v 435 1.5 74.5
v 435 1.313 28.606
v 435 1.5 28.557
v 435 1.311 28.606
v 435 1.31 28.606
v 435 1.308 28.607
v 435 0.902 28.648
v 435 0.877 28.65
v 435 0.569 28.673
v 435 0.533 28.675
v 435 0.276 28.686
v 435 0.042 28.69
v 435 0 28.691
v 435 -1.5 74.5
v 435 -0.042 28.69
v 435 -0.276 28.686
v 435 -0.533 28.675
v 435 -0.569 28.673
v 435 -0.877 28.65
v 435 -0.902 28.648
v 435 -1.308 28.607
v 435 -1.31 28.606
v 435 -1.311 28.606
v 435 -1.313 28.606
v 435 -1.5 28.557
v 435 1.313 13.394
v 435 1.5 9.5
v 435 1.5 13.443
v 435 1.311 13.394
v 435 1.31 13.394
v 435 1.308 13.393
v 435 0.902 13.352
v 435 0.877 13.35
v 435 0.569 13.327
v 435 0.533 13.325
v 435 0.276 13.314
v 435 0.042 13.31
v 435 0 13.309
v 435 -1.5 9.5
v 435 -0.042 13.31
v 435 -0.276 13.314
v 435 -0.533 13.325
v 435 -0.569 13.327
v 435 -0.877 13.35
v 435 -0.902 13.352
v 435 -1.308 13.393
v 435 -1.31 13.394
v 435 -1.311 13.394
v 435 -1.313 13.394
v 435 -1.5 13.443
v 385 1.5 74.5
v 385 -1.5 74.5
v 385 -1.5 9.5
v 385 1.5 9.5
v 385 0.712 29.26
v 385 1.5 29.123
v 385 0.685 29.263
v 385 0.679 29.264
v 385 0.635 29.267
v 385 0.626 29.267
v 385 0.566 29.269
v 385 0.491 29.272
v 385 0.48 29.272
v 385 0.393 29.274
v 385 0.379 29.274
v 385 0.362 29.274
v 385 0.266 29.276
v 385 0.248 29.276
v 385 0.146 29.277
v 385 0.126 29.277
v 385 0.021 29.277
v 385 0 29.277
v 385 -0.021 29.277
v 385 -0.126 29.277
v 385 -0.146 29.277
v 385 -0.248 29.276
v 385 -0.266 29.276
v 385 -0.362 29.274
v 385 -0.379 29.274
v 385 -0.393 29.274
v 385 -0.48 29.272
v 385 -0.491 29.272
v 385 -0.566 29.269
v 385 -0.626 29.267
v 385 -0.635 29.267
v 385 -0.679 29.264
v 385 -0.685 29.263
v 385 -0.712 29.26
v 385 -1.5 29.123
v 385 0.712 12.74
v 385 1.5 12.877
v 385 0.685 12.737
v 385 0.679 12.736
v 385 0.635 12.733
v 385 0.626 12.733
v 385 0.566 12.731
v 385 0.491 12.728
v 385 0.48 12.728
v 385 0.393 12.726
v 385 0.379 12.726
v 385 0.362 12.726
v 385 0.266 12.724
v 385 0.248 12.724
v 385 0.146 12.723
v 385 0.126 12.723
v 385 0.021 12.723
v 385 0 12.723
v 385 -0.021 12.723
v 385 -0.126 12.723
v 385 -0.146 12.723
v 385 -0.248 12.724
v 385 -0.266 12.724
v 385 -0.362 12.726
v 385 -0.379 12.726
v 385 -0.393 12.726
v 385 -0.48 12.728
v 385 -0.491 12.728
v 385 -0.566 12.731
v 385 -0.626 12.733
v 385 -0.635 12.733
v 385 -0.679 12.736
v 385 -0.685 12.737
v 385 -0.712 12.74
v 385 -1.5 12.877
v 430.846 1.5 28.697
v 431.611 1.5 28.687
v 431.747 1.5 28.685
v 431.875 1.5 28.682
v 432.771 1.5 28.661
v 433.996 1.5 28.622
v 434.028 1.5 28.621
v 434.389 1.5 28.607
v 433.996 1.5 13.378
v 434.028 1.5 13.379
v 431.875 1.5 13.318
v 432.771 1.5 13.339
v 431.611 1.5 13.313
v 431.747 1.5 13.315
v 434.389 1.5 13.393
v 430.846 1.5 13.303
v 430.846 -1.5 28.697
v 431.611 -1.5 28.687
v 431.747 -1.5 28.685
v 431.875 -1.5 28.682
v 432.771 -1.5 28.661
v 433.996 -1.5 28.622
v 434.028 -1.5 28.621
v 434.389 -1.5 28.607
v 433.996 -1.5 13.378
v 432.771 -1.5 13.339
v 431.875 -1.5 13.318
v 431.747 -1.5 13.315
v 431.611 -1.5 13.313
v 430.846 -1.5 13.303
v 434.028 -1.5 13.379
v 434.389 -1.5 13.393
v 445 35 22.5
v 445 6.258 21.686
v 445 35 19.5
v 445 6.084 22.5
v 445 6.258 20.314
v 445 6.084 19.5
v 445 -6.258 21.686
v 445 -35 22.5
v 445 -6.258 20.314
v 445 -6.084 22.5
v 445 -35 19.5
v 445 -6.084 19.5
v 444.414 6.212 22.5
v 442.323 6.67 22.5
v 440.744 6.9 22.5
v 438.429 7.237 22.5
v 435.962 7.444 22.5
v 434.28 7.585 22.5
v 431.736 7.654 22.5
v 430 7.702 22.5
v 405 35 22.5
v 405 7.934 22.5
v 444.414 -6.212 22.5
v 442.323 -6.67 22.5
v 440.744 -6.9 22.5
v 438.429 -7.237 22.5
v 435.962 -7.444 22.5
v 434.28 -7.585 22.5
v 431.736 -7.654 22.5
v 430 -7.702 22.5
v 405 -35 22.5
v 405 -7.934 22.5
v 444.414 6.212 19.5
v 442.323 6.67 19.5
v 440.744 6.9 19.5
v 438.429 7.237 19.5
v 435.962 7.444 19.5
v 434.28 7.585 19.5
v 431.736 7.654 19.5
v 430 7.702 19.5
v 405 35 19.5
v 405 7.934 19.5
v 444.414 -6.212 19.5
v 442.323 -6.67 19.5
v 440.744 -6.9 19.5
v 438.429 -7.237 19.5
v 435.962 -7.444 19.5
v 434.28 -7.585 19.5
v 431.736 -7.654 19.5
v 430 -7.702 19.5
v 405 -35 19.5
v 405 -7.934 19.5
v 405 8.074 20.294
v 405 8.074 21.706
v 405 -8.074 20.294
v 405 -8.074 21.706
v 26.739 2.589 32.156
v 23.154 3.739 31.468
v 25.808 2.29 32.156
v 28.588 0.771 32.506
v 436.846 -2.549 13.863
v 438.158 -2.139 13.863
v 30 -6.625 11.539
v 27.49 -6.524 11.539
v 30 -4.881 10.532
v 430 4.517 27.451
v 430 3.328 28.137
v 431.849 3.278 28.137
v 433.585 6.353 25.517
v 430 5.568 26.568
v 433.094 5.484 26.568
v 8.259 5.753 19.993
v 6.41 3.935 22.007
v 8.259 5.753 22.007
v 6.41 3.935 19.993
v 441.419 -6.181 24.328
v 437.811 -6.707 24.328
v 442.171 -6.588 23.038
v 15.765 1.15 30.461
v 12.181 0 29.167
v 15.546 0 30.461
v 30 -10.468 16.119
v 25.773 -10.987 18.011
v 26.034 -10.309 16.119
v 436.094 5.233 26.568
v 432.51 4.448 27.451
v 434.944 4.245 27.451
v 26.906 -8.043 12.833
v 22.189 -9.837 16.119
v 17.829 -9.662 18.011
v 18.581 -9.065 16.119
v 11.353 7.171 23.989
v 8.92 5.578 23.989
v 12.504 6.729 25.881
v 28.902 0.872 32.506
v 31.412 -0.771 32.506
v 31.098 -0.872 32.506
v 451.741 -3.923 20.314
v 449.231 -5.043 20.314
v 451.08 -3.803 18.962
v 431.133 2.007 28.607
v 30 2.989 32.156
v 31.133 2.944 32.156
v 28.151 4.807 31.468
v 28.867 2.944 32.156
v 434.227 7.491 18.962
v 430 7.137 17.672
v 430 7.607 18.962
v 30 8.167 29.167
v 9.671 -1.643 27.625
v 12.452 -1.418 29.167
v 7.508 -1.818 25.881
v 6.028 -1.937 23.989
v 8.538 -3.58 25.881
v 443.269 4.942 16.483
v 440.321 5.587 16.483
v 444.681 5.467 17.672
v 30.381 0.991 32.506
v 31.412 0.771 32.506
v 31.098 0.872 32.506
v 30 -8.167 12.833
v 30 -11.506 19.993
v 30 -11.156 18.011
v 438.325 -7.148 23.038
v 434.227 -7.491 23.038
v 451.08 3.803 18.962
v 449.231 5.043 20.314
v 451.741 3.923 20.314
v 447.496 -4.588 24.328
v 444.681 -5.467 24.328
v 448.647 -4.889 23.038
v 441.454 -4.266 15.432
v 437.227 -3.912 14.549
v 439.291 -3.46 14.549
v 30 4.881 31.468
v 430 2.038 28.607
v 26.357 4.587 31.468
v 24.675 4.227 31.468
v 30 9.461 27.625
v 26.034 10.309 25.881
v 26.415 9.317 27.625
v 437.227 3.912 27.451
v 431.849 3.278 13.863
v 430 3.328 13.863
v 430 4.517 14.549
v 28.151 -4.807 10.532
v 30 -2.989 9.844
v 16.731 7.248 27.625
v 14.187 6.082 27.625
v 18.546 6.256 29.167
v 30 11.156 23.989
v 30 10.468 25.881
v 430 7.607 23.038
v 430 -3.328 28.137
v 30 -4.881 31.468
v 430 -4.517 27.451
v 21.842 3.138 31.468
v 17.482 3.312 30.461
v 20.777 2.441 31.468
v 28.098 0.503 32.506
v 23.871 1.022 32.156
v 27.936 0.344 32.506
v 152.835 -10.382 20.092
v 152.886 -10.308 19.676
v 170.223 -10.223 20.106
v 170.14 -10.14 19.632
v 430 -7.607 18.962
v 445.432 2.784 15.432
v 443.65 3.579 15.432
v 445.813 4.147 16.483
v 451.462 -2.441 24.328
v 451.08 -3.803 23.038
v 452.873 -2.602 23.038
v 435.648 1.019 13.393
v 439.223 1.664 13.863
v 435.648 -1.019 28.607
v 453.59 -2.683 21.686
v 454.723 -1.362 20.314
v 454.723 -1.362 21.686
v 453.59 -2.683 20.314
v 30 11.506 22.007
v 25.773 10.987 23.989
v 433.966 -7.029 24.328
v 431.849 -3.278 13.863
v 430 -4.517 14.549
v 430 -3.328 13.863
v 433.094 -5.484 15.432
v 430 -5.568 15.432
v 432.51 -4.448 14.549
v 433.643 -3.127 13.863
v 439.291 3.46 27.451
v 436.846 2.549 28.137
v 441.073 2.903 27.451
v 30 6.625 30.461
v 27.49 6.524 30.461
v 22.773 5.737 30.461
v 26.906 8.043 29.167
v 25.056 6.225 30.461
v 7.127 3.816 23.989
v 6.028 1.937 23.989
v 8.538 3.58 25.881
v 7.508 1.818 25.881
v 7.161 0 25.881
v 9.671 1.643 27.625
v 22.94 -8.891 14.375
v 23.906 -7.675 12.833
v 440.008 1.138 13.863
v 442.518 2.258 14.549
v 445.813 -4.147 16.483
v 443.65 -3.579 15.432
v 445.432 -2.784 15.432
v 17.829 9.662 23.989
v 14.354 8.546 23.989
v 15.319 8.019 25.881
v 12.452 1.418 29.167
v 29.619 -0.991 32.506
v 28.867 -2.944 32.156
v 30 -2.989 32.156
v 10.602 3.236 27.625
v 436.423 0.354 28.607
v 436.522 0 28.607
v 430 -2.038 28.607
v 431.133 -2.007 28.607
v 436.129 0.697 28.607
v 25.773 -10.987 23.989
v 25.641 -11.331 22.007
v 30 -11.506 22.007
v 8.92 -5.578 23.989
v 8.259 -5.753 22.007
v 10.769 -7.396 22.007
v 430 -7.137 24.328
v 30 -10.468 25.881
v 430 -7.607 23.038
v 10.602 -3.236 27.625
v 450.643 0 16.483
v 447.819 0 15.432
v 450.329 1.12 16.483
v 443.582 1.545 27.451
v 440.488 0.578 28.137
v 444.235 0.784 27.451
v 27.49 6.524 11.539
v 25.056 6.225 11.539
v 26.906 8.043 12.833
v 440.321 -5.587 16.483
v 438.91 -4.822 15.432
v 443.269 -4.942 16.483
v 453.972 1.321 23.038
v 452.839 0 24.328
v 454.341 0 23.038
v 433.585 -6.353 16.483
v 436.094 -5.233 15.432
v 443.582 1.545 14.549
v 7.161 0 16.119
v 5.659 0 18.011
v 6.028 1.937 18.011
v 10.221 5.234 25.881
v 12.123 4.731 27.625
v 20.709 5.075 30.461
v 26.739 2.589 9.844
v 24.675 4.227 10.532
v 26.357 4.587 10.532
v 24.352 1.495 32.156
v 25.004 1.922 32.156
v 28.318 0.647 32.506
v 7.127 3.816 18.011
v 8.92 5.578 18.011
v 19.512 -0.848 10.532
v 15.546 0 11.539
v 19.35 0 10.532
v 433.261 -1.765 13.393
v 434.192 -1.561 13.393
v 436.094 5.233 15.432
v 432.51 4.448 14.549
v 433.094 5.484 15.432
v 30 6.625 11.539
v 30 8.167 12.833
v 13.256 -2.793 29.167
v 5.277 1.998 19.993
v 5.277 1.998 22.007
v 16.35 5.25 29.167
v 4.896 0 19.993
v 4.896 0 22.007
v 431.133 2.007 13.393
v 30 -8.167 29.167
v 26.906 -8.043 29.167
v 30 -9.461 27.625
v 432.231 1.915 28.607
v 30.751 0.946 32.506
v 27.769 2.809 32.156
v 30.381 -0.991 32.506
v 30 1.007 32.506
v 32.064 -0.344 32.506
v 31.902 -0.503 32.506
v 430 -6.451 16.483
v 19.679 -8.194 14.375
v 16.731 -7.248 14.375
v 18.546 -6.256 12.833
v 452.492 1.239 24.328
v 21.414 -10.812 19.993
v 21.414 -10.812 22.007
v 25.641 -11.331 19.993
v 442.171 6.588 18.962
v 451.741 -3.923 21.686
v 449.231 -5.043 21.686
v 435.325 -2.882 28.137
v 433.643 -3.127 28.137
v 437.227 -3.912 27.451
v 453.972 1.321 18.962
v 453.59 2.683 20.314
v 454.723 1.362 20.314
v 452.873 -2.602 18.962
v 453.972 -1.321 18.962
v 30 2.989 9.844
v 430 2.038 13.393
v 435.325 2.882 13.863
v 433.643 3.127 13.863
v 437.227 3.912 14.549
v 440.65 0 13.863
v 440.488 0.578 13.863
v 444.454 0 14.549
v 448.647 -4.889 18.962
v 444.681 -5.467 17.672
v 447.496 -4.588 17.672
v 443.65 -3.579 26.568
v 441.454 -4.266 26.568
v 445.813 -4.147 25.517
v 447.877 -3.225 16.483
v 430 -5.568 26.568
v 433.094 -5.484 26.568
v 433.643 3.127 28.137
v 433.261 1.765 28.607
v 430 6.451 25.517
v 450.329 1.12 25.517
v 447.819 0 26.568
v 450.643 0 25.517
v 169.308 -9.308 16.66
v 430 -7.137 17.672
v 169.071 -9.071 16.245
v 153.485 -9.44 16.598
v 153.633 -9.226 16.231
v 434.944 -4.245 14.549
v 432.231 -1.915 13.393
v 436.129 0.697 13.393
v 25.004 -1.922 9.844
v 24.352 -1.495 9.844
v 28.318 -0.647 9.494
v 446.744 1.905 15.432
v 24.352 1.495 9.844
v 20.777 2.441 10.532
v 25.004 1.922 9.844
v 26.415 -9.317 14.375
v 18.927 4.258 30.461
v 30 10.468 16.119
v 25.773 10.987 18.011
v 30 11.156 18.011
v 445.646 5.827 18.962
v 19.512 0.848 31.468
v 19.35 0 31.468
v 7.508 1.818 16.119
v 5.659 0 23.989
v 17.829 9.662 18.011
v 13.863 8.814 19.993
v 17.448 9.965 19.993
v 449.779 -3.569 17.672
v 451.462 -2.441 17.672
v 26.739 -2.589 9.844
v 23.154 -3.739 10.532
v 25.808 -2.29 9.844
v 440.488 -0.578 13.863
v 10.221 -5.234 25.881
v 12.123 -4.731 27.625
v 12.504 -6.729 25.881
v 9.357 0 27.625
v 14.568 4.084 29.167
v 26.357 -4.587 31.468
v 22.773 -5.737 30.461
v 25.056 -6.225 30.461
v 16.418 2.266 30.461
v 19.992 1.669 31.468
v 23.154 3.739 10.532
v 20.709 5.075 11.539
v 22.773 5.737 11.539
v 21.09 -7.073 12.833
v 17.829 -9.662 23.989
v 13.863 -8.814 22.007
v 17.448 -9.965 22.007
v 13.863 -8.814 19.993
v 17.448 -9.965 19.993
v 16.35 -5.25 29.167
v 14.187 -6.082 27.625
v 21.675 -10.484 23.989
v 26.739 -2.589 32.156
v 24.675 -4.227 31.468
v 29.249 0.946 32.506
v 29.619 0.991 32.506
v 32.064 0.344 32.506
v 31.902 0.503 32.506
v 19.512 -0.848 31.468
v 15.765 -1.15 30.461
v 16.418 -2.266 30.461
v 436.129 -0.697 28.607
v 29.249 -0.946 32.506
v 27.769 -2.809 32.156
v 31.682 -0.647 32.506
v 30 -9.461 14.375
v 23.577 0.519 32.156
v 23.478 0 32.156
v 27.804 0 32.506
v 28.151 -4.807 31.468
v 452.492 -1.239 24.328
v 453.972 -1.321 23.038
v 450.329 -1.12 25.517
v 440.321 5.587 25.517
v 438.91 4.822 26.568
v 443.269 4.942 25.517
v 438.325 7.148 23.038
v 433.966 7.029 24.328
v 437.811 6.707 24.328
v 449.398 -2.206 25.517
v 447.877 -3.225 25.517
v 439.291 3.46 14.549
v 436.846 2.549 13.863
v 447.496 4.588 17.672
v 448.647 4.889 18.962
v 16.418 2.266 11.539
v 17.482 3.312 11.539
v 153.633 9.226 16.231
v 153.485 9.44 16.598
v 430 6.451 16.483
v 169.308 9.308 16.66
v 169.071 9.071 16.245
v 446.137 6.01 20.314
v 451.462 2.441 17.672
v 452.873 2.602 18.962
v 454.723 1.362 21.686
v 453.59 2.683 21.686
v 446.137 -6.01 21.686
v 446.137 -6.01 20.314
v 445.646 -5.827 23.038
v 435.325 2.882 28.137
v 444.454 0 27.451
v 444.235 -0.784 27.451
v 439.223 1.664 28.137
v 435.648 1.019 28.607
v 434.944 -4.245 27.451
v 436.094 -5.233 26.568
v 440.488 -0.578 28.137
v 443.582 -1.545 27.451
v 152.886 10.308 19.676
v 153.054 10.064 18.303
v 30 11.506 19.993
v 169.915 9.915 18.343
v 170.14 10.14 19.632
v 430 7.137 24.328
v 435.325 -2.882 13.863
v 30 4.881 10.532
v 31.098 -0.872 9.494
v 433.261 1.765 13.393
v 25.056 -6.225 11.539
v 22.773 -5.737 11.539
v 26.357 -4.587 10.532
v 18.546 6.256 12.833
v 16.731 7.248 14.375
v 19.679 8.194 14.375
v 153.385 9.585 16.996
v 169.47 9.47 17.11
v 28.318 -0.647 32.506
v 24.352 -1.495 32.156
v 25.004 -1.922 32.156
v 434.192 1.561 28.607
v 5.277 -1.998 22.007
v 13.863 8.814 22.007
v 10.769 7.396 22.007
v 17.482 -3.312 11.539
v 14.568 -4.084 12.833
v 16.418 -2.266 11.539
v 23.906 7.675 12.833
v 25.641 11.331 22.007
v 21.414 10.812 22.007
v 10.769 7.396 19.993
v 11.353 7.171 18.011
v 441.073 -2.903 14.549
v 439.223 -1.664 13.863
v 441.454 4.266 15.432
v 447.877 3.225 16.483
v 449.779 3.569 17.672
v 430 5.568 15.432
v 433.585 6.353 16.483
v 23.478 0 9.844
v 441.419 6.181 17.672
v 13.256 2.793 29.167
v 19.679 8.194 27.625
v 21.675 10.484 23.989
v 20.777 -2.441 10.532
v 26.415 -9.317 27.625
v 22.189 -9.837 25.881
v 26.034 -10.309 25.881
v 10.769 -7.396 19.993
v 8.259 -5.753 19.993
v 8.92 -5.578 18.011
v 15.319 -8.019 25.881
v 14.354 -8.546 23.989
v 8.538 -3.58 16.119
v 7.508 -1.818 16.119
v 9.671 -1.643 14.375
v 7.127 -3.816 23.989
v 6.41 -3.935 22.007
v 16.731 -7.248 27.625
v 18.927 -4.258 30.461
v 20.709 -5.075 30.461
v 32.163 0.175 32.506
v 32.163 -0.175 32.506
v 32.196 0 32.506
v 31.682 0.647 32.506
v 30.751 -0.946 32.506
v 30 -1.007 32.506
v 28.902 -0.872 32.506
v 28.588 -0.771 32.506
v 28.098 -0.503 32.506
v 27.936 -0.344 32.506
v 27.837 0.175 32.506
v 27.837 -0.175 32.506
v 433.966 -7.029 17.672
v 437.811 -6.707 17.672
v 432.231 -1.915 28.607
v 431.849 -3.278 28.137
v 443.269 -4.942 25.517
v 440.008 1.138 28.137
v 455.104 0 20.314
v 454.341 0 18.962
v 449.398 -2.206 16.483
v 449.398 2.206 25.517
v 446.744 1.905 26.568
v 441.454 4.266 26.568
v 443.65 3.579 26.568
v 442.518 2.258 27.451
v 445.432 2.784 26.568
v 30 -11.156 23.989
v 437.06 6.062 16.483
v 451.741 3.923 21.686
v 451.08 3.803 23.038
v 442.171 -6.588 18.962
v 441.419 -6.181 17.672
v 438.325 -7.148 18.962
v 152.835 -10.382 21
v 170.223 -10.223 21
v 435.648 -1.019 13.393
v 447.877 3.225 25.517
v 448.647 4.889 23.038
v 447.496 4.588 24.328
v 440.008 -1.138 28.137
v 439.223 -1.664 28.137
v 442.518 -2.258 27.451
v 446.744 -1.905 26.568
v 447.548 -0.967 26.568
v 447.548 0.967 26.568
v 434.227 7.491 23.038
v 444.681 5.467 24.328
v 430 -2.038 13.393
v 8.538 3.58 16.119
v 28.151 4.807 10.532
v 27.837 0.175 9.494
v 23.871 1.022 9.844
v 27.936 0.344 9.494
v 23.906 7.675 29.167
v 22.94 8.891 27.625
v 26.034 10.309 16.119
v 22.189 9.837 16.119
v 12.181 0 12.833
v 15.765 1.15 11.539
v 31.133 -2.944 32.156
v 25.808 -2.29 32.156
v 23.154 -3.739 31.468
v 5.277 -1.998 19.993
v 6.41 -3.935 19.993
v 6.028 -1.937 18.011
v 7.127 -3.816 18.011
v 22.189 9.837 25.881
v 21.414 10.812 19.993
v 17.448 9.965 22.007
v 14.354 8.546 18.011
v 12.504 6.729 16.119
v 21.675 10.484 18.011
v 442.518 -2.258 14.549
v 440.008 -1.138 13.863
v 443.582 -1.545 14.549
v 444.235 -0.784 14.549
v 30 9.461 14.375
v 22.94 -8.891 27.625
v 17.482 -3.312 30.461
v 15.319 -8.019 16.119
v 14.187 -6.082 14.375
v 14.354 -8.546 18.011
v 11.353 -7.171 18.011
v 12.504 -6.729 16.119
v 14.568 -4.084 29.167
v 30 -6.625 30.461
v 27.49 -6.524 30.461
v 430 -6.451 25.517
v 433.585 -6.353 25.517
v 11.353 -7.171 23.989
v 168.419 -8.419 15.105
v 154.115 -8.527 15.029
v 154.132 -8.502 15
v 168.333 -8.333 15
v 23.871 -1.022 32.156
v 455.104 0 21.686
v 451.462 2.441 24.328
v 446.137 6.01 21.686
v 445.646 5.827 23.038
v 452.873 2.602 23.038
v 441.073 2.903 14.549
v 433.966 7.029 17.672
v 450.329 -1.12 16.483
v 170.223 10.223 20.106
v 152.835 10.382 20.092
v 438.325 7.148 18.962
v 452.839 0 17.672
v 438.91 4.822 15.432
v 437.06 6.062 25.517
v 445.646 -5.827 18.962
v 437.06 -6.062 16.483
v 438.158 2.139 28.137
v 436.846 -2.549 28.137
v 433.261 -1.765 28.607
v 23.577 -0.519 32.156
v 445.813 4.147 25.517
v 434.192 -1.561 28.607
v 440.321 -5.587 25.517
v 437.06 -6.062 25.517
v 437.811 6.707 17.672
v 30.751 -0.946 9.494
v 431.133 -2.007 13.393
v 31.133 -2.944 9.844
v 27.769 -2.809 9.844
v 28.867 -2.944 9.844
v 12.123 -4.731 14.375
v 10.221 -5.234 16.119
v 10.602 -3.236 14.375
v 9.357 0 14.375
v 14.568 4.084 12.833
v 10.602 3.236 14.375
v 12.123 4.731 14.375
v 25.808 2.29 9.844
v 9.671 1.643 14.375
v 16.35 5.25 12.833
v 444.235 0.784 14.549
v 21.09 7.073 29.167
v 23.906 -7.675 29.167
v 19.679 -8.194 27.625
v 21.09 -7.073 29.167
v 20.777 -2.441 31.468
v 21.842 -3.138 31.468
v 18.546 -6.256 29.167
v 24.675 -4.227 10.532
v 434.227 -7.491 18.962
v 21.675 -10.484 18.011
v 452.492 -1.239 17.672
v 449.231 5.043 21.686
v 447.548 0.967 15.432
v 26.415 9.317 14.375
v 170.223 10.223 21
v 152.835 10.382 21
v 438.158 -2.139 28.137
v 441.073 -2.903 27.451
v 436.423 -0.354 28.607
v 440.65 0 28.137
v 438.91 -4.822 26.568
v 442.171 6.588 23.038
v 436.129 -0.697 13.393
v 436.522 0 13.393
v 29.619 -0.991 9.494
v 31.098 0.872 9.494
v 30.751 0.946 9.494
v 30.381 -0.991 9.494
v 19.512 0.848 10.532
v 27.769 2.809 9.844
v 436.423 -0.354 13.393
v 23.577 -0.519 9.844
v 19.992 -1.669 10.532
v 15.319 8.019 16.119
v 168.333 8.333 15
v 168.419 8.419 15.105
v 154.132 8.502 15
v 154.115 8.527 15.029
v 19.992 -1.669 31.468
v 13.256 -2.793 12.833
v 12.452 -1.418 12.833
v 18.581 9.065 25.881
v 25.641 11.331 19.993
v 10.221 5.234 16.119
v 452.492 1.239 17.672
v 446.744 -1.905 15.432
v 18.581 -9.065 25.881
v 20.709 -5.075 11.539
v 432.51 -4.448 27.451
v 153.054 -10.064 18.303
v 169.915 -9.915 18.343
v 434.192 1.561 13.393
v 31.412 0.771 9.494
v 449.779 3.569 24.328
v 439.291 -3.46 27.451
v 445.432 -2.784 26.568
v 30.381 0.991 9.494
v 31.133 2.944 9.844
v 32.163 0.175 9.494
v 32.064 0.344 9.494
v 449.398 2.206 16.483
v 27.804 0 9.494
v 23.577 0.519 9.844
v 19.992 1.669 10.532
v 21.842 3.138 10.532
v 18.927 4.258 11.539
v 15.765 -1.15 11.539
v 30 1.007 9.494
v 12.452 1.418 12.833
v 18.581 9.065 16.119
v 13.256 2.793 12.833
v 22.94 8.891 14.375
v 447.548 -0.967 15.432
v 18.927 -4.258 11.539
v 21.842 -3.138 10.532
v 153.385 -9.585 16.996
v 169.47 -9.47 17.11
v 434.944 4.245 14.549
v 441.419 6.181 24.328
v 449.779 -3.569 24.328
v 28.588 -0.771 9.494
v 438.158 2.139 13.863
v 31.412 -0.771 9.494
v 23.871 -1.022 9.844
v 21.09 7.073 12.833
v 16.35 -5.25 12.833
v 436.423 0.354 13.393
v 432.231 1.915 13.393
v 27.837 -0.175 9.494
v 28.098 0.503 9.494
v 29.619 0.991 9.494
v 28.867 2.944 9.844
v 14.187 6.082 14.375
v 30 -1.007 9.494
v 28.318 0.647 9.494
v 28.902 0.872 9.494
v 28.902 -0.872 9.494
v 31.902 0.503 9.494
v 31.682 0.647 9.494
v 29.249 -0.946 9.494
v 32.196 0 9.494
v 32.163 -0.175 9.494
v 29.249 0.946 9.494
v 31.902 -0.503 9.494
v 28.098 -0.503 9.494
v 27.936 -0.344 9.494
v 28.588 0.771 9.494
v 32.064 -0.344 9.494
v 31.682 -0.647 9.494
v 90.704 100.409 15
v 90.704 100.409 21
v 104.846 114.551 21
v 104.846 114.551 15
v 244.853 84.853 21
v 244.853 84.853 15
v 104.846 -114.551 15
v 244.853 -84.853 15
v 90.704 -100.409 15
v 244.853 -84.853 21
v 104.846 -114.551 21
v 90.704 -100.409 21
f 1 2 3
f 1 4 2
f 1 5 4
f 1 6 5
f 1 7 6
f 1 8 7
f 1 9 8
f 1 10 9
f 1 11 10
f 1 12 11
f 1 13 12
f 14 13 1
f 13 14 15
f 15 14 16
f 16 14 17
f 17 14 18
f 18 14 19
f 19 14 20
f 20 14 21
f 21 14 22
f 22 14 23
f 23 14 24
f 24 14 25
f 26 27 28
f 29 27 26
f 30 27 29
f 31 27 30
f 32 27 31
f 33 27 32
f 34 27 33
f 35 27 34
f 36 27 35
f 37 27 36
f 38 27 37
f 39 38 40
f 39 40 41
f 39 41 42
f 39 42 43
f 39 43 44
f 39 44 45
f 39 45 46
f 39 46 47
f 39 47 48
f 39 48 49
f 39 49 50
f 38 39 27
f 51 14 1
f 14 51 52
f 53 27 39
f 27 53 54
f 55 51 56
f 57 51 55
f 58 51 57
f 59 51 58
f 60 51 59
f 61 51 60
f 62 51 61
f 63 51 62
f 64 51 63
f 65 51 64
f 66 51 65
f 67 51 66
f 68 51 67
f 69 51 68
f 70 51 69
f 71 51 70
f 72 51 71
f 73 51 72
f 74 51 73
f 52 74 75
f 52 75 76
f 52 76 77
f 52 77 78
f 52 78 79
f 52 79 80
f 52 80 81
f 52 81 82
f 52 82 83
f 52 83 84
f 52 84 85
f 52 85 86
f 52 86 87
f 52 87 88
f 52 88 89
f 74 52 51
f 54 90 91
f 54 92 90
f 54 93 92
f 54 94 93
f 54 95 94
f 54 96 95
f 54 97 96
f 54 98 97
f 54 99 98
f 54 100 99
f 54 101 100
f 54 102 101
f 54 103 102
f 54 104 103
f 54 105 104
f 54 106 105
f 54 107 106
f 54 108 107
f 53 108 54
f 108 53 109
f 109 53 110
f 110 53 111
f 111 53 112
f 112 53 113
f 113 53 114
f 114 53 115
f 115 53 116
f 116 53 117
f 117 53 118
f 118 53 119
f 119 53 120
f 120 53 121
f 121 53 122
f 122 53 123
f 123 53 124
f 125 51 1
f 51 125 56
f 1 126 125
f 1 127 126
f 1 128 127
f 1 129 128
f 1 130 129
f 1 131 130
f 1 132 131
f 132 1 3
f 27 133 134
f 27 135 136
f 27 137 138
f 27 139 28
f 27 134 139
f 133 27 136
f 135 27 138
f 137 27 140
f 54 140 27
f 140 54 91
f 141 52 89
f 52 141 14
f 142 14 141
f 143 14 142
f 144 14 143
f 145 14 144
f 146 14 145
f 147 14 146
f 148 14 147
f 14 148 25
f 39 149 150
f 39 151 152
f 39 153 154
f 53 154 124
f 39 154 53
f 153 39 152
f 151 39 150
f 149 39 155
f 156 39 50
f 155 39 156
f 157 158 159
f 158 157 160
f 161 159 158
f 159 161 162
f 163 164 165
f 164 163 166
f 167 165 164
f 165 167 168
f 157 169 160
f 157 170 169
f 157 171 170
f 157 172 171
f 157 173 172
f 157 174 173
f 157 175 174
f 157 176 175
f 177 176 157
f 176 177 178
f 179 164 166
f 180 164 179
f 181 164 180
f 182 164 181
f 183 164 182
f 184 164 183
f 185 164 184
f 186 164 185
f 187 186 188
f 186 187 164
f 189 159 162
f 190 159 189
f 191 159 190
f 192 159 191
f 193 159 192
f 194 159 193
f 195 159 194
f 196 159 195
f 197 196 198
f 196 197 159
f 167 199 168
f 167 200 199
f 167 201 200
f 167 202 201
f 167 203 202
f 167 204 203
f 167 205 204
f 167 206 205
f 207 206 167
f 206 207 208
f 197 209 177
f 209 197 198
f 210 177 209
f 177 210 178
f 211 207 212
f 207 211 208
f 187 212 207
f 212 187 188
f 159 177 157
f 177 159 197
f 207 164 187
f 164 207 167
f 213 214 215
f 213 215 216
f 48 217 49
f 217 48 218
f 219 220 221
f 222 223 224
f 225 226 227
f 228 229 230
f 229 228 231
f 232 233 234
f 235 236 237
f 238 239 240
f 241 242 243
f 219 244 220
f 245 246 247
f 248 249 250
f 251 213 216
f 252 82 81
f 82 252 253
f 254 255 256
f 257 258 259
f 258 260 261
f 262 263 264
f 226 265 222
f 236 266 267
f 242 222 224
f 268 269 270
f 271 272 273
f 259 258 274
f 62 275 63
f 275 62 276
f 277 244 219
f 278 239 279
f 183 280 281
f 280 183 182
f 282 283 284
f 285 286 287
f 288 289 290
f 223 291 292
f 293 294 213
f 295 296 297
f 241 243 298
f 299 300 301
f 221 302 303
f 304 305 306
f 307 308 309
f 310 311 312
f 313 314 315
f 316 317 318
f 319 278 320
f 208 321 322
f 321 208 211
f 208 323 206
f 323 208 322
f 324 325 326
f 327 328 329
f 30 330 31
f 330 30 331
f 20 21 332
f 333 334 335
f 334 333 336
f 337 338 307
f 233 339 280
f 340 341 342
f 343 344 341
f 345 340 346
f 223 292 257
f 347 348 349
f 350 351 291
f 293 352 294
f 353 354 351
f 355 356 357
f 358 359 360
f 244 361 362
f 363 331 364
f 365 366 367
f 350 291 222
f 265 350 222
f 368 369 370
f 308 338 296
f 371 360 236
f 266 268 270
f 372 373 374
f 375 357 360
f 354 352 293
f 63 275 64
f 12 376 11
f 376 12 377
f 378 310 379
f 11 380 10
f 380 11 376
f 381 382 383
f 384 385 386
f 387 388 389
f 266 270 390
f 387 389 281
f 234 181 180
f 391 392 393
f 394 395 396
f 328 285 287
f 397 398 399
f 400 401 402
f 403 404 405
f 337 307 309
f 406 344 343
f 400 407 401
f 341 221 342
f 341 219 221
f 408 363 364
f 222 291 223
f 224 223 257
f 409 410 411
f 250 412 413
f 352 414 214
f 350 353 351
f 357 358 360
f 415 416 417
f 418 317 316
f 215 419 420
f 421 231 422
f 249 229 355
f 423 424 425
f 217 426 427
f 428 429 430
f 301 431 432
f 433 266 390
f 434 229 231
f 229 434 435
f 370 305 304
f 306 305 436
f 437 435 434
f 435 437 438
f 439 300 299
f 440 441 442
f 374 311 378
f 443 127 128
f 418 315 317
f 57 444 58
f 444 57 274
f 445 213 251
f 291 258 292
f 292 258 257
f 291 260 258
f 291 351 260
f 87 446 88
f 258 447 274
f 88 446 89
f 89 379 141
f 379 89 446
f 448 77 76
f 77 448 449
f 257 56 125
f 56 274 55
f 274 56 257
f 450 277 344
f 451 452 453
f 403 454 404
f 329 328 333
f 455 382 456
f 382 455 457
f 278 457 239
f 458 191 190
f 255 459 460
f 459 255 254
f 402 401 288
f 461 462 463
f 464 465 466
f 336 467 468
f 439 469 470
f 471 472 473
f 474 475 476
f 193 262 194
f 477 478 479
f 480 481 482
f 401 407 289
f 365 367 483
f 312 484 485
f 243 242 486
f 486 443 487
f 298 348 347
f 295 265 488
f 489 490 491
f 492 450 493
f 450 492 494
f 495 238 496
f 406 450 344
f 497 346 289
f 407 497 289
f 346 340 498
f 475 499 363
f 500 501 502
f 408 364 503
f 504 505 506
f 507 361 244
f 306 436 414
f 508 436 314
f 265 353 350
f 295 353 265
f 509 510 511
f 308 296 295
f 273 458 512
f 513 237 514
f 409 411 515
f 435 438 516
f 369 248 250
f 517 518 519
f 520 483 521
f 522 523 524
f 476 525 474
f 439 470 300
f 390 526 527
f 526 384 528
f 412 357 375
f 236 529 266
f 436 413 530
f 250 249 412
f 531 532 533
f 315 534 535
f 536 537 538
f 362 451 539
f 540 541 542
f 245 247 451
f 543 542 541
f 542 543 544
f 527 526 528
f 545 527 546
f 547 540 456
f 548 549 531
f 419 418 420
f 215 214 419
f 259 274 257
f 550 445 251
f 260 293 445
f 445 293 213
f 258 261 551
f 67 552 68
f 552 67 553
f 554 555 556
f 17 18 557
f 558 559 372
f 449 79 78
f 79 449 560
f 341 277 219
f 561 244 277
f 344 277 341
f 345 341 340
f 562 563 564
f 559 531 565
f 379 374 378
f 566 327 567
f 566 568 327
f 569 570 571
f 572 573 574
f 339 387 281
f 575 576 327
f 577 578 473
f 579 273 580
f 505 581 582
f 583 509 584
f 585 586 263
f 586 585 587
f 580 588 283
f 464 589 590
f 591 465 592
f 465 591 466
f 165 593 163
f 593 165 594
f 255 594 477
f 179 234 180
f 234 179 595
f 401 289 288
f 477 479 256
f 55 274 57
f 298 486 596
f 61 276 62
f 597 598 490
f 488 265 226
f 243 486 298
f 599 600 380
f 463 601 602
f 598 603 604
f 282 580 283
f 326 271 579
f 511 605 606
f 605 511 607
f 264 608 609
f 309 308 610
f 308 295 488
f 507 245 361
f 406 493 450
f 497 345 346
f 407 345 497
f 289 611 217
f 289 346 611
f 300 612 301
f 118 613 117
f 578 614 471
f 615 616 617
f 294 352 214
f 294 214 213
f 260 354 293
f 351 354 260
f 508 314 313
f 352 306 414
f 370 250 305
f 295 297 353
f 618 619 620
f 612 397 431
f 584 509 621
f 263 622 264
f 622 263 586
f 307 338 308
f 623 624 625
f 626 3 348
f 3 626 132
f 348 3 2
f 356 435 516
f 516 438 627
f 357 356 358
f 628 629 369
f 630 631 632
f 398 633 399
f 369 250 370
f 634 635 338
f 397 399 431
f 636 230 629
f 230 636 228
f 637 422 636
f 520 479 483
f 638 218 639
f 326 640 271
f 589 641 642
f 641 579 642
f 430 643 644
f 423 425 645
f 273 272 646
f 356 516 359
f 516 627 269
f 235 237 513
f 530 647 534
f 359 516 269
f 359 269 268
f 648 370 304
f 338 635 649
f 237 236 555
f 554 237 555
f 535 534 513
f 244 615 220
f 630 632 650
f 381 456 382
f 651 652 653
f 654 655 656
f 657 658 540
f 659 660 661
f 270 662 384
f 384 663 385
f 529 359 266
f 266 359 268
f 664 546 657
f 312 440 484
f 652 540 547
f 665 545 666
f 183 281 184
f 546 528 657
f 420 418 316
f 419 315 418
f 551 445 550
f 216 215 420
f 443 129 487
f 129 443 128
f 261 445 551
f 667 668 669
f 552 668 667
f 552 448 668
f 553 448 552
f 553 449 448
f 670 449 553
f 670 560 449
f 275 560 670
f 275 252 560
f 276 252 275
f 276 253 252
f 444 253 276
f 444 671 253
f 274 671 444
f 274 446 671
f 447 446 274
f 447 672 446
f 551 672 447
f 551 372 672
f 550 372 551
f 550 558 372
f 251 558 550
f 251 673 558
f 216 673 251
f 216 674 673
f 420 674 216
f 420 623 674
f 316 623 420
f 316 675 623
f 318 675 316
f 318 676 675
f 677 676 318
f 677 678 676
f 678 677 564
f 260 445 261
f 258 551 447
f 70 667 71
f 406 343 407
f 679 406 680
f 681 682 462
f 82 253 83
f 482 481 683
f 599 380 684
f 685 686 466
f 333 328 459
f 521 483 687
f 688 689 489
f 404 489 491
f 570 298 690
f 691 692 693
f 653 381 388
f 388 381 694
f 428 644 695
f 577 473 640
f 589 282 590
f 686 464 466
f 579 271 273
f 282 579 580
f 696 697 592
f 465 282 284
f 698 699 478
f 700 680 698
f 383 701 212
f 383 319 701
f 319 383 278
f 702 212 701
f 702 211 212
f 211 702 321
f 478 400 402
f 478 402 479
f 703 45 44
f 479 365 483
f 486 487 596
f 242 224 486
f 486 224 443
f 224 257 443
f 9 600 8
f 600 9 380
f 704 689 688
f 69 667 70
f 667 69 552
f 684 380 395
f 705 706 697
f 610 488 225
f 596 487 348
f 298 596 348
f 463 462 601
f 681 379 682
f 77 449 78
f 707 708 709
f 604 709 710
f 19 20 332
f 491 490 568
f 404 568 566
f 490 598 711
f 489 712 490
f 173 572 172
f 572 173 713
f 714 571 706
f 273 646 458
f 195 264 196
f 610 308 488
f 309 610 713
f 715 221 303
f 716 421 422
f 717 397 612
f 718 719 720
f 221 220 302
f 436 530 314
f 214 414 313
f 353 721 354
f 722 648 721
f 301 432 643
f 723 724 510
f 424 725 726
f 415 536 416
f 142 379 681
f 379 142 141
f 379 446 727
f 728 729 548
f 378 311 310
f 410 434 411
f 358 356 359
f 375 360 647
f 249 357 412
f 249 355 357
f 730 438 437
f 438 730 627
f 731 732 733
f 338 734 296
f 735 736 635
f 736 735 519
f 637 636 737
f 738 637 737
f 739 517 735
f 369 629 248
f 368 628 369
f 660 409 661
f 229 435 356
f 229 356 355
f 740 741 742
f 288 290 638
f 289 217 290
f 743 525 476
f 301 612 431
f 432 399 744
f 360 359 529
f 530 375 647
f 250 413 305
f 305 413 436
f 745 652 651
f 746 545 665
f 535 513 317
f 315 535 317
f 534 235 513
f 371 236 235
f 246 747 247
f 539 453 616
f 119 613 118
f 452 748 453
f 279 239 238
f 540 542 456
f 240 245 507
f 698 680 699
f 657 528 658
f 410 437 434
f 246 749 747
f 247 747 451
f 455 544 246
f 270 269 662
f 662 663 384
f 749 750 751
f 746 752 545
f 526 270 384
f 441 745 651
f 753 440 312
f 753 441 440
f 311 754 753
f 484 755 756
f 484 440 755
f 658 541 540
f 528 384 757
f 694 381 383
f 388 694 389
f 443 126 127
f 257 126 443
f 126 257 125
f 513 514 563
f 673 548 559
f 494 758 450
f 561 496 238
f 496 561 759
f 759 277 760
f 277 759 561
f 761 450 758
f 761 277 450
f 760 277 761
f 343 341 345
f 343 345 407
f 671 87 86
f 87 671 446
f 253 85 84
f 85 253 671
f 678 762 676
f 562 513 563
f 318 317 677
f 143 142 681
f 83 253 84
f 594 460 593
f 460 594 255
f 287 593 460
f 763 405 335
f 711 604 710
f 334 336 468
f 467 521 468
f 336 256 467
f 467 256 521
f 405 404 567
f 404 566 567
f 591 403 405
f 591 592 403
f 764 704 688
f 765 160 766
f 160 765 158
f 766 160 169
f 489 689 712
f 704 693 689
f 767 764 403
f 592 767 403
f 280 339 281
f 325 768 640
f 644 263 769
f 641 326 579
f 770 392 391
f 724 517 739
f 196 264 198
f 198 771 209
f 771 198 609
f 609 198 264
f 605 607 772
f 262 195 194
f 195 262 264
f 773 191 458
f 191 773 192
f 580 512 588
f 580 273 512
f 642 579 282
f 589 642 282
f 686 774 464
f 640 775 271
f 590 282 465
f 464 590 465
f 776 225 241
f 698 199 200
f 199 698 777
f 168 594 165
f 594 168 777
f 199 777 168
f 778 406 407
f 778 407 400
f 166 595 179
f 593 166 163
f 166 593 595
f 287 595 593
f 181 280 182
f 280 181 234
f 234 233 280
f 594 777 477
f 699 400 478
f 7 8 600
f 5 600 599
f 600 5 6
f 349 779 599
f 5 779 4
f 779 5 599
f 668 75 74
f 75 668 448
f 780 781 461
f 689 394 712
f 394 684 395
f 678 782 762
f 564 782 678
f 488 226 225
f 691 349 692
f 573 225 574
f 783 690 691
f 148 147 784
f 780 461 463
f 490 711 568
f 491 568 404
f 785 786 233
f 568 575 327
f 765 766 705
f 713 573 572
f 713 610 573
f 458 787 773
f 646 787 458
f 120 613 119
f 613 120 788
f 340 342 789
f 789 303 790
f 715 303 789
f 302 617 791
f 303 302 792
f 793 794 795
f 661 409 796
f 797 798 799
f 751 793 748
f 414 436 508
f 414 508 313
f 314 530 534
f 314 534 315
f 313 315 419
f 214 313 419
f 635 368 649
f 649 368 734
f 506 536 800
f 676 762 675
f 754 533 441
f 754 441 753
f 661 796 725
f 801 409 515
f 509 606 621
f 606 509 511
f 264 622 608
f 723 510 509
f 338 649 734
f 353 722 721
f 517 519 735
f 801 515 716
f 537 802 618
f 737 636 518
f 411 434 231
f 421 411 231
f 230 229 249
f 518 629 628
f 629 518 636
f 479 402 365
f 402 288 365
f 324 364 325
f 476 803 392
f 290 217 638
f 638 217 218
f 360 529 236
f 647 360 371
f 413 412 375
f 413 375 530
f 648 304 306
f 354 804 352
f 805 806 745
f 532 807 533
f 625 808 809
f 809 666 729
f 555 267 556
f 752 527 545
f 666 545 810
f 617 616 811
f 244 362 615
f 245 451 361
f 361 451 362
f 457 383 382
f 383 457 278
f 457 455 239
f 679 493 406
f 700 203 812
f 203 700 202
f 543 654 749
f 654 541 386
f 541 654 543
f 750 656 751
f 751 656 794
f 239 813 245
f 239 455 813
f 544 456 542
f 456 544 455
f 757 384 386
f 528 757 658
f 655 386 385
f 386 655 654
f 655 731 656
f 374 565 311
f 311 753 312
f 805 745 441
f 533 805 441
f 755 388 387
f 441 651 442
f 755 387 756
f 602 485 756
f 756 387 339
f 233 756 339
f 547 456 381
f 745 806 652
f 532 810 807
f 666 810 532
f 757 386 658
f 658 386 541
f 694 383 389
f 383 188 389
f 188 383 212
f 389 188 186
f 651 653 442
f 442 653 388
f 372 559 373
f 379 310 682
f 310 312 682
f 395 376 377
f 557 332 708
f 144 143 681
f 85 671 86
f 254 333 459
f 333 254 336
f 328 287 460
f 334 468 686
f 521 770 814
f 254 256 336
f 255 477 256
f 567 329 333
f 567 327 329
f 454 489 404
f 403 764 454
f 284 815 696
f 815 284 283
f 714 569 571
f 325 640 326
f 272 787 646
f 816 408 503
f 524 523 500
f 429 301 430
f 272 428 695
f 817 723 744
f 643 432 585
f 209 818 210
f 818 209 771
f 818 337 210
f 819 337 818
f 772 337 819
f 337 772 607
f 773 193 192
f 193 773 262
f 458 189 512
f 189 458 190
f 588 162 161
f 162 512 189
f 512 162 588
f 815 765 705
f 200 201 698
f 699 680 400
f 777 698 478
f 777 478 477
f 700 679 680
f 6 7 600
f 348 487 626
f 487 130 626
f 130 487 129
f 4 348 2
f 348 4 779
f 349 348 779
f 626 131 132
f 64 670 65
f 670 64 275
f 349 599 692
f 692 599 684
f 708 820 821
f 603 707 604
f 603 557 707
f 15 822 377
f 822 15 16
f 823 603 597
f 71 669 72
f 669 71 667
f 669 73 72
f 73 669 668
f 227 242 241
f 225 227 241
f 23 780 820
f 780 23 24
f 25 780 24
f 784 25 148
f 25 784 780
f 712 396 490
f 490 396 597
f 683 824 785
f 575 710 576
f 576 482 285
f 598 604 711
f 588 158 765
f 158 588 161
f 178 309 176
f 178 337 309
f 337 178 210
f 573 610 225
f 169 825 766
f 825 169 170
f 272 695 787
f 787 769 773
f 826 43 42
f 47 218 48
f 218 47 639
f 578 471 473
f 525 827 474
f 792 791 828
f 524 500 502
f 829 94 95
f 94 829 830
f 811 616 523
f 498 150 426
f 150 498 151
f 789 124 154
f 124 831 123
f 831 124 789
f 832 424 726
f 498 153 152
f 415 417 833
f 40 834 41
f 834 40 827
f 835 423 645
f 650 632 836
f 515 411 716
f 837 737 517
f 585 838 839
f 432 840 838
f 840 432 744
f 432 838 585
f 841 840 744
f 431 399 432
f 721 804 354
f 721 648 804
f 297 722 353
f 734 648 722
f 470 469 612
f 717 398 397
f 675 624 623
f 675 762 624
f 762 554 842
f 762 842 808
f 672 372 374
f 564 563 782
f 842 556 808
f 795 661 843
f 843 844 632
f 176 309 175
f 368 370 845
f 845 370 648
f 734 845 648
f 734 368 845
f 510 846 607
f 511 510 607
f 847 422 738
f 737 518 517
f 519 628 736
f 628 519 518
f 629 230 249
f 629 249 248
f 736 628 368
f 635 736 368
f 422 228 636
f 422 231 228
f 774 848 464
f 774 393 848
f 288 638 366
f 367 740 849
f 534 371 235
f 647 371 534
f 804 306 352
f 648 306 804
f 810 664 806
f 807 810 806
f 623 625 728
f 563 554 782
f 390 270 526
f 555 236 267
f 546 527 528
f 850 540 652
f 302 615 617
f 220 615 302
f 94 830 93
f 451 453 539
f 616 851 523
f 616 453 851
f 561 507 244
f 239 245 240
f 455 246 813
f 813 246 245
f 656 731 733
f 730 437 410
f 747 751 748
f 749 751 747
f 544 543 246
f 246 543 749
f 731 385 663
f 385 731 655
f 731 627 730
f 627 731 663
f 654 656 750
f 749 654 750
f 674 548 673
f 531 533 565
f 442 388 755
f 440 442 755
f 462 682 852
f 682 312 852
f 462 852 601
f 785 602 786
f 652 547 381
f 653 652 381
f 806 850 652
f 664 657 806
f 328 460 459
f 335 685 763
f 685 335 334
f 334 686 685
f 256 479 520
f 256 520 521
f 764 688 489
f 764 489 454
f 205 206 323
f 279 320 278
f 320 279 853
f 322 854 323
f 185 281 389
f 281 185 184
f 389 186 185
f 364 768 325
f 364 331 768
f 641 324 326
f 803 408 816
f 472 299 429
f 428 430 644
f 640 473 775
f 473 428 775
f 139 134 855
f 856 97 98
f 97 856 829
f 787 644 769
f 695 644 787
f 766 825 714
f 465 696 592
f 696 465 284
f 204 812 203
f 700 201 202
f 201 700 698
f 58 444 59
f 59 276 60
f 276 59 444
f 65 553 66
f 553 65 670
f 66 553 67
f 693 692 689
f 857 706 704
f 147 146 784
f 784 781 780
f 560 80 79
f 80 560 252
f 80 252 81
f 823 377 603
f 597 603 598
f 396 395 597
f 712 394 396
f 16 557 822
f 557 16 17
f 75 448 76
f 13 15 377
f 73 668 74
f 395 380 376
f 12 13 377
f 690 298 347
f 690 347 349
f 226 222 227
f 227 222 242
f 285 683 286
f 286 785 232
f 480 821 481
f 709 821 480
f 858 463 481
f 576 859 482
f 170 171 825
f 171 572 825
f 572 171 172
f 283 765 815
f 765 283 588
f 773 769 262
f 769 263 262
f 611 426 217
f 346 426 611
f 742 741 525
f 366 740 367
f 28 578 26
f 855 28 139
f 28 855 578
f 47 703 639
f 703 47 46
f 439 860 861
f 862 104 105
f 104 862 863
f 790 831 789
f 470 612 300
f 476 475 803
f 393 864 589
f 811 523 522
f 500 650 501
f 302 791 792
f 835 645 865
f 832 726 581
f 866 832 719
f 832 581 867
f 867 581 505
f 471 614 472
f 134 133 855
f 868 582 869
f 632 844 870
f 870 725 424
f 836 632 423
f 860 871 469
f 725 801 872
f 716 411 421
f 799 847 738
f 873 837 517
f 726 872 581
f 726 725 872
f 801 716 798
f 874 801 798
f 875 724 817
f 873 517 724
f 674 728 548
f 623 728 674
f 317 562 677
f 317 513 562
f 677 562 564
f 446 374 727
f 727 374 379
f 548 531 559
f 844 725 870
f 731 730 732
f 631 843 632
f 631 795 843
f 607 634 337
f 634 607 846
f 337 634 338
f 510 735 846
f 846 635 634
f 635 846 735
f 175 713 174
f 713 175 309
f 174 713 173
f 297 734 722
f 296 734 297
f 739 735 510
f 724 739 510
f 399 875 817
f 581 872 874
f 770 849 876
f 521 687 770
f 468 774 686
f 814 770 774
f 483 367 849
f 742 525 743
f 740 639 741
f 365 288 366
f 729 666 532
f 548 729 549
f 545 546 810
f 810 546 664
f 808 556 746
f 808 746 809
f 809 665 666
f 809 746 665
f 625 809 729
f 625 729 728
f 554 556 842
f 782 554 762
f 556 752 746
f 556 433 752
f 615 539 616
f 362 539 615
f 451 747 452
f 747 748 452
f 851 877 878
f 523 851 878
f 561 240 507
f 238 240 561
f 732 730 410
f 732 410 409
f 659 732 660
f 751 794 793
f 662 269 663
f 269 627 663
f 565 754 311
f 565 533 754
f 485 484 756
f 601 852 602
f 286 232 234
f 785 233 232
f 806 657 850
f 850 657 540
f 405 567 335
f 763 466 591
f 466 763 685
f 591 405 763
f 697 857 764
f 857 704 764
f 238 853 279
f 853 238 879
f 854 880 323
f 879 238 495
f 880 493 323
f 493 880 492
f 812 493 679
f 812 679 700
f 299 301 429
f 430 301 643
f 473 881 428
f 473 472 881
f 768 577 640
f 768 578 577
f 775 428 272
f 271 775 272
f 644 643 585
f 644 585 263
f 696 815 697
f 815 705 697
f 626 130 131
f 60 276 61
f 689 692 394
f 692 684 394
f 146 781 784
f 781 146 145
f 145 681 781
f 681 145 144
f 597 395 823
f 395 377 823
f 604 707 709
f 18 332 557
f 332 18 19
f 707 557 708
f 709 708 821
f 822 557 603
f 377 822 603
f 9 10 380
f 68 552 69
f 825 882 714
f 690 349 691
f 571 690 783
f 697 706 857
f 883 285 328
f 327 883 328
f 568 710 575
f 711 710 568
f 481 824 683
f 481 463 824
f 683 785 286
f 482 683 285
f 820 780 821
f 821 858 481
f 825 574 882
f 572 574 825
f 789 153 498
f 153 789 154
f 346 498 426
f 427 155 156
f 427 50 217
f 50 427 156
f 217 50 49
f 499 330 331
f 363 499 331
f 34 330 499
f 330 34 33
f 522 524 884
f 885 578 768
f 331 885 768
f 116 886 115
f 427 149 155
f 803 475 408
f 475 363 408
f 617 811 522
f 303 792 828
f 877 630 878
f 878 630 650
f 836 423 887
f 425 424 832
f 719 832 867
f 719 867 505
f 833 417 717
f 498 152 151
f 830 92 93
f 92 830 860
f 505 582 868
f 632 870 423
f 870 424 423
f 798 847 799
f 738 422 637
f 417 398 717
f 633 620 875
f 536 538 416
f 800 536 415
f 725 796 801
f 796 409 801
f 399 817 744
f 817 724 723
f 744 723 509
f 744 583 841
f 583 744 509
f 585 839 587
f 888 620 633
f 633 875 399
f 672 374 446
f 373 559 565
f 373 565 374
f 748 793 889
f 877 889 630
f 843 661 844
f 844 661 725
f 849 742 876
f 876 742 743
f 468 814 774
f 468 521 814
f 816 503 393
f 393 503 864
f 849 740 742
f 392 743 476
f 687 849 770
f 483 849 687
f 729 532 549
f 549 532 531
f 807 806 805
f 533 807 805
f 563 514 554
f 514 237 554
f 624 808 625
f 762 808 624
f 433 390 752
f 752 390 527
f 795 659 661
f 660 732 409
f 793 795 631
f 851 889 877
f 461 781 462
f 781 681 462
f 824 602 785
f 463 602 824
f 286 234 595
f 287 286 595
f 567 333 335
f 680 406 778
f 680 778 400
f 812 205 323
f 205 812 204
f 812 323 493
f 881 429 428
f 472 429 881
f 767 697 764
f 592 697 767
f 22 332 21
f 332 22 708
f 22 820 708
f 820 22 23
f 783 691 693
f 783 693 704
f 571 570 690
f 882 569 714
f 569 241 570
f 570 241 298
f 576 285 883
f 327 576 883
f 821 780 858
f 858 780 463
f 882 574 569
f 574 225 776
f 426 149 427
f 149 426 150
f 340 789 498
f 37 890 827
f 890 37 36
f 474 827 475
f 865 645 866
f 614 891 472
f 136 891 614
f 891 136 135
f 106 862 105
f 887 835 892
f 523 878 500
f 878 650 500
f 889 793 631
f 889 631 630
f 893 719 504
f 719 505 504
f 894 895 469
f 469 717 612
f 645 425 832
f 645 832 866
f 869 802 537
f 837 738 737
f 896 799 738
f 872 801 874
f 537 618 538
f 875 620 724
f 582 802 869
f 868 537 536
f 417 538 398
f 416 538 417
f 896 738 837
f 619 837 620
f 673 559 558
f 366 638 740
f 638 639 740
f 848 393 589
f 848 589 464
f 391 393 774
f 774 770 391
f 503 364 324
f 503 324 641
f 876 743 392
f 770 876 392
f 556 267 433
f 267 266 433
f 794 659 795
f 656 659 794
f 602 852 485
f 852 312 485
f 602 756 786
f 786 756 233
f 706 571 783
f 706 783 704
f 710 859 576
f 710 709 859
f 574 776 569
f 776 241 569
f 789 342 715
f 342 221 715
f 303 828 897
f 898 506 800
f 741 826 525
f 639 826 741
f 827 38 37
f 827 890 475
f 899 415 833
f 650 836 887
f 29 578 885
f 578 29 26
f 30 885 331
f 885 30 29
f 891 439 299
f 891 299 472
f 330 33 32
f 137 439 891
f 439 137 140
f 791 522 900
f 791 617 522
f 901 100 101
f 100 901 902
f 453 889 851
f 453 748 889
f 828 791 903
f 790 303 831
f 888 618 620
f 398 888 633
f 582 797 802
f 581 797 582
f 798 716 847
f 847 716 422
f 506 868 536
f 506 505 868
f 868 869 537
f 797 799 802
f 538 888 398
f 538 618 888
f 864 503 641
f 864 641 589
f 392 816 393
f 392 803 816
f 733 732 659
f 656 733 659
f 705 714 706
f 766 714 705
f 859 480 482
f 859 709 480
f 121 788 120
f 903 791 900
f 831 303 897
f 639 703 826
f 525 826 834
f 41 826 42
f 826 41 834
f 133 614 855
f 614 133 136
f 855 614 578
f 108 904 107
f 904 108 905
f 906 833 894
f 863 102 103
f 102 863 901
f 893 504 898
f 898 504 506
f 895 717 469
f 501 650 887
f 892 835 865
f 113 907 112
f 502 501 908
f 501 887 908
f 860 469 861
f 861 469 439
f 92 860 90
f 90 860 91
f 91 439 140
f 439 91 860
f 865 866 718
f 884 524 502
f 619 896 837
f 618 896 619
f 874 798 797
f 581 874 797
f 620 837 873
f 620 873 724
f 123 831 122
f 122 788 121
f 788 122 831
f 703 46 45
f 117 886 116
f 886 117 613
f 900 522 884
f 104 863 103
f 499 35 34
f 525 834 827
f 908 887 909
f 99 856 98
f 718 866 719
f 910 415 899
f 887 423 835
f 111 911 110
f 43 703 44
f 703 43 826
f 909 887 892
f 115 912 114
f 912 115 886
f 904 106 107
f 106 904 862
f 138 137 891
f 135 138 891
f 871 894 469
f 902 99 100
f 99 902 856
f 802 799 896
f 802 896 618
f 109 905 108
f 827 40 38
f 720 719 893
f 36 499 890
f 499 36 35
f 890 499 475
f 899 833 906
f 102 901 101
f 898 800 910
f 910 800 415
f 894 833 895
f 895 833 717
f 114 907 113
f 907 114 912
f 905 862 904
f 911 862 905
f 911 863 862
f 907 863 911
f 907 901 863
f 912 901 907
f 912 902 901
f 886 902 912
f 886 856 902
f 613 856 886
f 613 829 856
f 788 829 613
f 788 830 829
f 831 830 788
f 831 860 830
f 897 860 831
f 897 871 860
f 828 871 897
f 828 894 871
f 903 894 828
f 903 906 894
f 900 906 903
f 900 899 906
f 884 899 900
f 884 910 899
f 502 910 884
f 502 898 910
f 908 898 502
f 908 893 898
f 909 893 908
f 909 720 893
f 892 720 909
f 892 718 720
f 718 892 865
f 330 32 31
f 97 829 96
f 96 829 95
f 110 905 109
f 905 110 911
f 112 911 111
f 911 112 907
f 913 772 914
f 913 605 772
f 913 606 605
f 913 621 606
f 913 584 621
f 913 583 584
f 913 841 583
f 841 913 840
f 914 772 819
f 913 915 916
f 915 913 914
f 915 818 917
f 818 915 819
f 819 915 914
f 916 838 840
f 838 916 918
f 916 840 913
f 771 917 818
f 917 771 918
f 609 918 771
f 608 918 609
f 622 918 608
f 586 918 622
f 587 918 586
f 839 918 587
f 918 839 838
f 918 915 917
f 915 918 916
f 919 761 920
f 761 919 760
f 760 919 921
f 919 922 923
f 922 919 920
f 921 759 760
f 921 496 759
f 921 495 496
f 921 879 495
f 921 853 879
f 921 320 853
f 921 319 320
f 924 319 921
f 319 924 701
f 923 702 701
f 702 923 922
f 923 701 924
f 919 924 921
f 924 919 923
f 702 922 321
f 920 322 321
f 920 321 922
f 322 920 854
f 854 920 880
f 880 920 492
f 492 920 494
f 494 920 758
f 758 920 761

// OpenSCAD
// ISM-XB-1 supersonic bomber study OML — B1 #39
// Units: mm. Proportion sketch only.
// No stores / munitions geometry.

fuselage_length = 480;
fuselage_d = 42;
wing_span = 240;
wing_root = 120;
wing_tip = 20;
wing_sweep = 45;
wing_z = 18;

module fuselage() {
    hull() {
        translate([30, 0, fuselage_d / 2])
            scale([1.2, 0.55, 0.55])
                sphere(d = fuselage_d, $fn = 36);
        translate([fuselage_length - 50, 0, fuselage_d / 2])
            scale([1.6, 0.5, 0.5])
                sphere(d = fuselage_d * 0.75, $fn = 36);
    }
}

module wing(side = 1) {
    translate([160, 0, wing_z])
        rotate([0, 0, side * wing_sweep])
            linear_extrude(height = 6, center = true)
                polygon([
                    [0, 0],
                    [wing_root, 0],
                    [wing_root * 0.35, side * wing_span / 2],
                    [wing_root * 0.35 - wing_tip, side * wing_span / 2]
                ]);
}

module empennage() {
    translate([fuselage_length - 70, 0, fuselage_d])
        cube([50, 3, 65], center = true);
    translate([fuselage_length - 55, 0, fuselage_d * 0.5])
        cube([40, 70, 3], center = true);
}

echo("B1 #39: supersonic bomber study OML — inert airframe only");
fuselage();
wing(+1);
wing(-1);
empennage();
